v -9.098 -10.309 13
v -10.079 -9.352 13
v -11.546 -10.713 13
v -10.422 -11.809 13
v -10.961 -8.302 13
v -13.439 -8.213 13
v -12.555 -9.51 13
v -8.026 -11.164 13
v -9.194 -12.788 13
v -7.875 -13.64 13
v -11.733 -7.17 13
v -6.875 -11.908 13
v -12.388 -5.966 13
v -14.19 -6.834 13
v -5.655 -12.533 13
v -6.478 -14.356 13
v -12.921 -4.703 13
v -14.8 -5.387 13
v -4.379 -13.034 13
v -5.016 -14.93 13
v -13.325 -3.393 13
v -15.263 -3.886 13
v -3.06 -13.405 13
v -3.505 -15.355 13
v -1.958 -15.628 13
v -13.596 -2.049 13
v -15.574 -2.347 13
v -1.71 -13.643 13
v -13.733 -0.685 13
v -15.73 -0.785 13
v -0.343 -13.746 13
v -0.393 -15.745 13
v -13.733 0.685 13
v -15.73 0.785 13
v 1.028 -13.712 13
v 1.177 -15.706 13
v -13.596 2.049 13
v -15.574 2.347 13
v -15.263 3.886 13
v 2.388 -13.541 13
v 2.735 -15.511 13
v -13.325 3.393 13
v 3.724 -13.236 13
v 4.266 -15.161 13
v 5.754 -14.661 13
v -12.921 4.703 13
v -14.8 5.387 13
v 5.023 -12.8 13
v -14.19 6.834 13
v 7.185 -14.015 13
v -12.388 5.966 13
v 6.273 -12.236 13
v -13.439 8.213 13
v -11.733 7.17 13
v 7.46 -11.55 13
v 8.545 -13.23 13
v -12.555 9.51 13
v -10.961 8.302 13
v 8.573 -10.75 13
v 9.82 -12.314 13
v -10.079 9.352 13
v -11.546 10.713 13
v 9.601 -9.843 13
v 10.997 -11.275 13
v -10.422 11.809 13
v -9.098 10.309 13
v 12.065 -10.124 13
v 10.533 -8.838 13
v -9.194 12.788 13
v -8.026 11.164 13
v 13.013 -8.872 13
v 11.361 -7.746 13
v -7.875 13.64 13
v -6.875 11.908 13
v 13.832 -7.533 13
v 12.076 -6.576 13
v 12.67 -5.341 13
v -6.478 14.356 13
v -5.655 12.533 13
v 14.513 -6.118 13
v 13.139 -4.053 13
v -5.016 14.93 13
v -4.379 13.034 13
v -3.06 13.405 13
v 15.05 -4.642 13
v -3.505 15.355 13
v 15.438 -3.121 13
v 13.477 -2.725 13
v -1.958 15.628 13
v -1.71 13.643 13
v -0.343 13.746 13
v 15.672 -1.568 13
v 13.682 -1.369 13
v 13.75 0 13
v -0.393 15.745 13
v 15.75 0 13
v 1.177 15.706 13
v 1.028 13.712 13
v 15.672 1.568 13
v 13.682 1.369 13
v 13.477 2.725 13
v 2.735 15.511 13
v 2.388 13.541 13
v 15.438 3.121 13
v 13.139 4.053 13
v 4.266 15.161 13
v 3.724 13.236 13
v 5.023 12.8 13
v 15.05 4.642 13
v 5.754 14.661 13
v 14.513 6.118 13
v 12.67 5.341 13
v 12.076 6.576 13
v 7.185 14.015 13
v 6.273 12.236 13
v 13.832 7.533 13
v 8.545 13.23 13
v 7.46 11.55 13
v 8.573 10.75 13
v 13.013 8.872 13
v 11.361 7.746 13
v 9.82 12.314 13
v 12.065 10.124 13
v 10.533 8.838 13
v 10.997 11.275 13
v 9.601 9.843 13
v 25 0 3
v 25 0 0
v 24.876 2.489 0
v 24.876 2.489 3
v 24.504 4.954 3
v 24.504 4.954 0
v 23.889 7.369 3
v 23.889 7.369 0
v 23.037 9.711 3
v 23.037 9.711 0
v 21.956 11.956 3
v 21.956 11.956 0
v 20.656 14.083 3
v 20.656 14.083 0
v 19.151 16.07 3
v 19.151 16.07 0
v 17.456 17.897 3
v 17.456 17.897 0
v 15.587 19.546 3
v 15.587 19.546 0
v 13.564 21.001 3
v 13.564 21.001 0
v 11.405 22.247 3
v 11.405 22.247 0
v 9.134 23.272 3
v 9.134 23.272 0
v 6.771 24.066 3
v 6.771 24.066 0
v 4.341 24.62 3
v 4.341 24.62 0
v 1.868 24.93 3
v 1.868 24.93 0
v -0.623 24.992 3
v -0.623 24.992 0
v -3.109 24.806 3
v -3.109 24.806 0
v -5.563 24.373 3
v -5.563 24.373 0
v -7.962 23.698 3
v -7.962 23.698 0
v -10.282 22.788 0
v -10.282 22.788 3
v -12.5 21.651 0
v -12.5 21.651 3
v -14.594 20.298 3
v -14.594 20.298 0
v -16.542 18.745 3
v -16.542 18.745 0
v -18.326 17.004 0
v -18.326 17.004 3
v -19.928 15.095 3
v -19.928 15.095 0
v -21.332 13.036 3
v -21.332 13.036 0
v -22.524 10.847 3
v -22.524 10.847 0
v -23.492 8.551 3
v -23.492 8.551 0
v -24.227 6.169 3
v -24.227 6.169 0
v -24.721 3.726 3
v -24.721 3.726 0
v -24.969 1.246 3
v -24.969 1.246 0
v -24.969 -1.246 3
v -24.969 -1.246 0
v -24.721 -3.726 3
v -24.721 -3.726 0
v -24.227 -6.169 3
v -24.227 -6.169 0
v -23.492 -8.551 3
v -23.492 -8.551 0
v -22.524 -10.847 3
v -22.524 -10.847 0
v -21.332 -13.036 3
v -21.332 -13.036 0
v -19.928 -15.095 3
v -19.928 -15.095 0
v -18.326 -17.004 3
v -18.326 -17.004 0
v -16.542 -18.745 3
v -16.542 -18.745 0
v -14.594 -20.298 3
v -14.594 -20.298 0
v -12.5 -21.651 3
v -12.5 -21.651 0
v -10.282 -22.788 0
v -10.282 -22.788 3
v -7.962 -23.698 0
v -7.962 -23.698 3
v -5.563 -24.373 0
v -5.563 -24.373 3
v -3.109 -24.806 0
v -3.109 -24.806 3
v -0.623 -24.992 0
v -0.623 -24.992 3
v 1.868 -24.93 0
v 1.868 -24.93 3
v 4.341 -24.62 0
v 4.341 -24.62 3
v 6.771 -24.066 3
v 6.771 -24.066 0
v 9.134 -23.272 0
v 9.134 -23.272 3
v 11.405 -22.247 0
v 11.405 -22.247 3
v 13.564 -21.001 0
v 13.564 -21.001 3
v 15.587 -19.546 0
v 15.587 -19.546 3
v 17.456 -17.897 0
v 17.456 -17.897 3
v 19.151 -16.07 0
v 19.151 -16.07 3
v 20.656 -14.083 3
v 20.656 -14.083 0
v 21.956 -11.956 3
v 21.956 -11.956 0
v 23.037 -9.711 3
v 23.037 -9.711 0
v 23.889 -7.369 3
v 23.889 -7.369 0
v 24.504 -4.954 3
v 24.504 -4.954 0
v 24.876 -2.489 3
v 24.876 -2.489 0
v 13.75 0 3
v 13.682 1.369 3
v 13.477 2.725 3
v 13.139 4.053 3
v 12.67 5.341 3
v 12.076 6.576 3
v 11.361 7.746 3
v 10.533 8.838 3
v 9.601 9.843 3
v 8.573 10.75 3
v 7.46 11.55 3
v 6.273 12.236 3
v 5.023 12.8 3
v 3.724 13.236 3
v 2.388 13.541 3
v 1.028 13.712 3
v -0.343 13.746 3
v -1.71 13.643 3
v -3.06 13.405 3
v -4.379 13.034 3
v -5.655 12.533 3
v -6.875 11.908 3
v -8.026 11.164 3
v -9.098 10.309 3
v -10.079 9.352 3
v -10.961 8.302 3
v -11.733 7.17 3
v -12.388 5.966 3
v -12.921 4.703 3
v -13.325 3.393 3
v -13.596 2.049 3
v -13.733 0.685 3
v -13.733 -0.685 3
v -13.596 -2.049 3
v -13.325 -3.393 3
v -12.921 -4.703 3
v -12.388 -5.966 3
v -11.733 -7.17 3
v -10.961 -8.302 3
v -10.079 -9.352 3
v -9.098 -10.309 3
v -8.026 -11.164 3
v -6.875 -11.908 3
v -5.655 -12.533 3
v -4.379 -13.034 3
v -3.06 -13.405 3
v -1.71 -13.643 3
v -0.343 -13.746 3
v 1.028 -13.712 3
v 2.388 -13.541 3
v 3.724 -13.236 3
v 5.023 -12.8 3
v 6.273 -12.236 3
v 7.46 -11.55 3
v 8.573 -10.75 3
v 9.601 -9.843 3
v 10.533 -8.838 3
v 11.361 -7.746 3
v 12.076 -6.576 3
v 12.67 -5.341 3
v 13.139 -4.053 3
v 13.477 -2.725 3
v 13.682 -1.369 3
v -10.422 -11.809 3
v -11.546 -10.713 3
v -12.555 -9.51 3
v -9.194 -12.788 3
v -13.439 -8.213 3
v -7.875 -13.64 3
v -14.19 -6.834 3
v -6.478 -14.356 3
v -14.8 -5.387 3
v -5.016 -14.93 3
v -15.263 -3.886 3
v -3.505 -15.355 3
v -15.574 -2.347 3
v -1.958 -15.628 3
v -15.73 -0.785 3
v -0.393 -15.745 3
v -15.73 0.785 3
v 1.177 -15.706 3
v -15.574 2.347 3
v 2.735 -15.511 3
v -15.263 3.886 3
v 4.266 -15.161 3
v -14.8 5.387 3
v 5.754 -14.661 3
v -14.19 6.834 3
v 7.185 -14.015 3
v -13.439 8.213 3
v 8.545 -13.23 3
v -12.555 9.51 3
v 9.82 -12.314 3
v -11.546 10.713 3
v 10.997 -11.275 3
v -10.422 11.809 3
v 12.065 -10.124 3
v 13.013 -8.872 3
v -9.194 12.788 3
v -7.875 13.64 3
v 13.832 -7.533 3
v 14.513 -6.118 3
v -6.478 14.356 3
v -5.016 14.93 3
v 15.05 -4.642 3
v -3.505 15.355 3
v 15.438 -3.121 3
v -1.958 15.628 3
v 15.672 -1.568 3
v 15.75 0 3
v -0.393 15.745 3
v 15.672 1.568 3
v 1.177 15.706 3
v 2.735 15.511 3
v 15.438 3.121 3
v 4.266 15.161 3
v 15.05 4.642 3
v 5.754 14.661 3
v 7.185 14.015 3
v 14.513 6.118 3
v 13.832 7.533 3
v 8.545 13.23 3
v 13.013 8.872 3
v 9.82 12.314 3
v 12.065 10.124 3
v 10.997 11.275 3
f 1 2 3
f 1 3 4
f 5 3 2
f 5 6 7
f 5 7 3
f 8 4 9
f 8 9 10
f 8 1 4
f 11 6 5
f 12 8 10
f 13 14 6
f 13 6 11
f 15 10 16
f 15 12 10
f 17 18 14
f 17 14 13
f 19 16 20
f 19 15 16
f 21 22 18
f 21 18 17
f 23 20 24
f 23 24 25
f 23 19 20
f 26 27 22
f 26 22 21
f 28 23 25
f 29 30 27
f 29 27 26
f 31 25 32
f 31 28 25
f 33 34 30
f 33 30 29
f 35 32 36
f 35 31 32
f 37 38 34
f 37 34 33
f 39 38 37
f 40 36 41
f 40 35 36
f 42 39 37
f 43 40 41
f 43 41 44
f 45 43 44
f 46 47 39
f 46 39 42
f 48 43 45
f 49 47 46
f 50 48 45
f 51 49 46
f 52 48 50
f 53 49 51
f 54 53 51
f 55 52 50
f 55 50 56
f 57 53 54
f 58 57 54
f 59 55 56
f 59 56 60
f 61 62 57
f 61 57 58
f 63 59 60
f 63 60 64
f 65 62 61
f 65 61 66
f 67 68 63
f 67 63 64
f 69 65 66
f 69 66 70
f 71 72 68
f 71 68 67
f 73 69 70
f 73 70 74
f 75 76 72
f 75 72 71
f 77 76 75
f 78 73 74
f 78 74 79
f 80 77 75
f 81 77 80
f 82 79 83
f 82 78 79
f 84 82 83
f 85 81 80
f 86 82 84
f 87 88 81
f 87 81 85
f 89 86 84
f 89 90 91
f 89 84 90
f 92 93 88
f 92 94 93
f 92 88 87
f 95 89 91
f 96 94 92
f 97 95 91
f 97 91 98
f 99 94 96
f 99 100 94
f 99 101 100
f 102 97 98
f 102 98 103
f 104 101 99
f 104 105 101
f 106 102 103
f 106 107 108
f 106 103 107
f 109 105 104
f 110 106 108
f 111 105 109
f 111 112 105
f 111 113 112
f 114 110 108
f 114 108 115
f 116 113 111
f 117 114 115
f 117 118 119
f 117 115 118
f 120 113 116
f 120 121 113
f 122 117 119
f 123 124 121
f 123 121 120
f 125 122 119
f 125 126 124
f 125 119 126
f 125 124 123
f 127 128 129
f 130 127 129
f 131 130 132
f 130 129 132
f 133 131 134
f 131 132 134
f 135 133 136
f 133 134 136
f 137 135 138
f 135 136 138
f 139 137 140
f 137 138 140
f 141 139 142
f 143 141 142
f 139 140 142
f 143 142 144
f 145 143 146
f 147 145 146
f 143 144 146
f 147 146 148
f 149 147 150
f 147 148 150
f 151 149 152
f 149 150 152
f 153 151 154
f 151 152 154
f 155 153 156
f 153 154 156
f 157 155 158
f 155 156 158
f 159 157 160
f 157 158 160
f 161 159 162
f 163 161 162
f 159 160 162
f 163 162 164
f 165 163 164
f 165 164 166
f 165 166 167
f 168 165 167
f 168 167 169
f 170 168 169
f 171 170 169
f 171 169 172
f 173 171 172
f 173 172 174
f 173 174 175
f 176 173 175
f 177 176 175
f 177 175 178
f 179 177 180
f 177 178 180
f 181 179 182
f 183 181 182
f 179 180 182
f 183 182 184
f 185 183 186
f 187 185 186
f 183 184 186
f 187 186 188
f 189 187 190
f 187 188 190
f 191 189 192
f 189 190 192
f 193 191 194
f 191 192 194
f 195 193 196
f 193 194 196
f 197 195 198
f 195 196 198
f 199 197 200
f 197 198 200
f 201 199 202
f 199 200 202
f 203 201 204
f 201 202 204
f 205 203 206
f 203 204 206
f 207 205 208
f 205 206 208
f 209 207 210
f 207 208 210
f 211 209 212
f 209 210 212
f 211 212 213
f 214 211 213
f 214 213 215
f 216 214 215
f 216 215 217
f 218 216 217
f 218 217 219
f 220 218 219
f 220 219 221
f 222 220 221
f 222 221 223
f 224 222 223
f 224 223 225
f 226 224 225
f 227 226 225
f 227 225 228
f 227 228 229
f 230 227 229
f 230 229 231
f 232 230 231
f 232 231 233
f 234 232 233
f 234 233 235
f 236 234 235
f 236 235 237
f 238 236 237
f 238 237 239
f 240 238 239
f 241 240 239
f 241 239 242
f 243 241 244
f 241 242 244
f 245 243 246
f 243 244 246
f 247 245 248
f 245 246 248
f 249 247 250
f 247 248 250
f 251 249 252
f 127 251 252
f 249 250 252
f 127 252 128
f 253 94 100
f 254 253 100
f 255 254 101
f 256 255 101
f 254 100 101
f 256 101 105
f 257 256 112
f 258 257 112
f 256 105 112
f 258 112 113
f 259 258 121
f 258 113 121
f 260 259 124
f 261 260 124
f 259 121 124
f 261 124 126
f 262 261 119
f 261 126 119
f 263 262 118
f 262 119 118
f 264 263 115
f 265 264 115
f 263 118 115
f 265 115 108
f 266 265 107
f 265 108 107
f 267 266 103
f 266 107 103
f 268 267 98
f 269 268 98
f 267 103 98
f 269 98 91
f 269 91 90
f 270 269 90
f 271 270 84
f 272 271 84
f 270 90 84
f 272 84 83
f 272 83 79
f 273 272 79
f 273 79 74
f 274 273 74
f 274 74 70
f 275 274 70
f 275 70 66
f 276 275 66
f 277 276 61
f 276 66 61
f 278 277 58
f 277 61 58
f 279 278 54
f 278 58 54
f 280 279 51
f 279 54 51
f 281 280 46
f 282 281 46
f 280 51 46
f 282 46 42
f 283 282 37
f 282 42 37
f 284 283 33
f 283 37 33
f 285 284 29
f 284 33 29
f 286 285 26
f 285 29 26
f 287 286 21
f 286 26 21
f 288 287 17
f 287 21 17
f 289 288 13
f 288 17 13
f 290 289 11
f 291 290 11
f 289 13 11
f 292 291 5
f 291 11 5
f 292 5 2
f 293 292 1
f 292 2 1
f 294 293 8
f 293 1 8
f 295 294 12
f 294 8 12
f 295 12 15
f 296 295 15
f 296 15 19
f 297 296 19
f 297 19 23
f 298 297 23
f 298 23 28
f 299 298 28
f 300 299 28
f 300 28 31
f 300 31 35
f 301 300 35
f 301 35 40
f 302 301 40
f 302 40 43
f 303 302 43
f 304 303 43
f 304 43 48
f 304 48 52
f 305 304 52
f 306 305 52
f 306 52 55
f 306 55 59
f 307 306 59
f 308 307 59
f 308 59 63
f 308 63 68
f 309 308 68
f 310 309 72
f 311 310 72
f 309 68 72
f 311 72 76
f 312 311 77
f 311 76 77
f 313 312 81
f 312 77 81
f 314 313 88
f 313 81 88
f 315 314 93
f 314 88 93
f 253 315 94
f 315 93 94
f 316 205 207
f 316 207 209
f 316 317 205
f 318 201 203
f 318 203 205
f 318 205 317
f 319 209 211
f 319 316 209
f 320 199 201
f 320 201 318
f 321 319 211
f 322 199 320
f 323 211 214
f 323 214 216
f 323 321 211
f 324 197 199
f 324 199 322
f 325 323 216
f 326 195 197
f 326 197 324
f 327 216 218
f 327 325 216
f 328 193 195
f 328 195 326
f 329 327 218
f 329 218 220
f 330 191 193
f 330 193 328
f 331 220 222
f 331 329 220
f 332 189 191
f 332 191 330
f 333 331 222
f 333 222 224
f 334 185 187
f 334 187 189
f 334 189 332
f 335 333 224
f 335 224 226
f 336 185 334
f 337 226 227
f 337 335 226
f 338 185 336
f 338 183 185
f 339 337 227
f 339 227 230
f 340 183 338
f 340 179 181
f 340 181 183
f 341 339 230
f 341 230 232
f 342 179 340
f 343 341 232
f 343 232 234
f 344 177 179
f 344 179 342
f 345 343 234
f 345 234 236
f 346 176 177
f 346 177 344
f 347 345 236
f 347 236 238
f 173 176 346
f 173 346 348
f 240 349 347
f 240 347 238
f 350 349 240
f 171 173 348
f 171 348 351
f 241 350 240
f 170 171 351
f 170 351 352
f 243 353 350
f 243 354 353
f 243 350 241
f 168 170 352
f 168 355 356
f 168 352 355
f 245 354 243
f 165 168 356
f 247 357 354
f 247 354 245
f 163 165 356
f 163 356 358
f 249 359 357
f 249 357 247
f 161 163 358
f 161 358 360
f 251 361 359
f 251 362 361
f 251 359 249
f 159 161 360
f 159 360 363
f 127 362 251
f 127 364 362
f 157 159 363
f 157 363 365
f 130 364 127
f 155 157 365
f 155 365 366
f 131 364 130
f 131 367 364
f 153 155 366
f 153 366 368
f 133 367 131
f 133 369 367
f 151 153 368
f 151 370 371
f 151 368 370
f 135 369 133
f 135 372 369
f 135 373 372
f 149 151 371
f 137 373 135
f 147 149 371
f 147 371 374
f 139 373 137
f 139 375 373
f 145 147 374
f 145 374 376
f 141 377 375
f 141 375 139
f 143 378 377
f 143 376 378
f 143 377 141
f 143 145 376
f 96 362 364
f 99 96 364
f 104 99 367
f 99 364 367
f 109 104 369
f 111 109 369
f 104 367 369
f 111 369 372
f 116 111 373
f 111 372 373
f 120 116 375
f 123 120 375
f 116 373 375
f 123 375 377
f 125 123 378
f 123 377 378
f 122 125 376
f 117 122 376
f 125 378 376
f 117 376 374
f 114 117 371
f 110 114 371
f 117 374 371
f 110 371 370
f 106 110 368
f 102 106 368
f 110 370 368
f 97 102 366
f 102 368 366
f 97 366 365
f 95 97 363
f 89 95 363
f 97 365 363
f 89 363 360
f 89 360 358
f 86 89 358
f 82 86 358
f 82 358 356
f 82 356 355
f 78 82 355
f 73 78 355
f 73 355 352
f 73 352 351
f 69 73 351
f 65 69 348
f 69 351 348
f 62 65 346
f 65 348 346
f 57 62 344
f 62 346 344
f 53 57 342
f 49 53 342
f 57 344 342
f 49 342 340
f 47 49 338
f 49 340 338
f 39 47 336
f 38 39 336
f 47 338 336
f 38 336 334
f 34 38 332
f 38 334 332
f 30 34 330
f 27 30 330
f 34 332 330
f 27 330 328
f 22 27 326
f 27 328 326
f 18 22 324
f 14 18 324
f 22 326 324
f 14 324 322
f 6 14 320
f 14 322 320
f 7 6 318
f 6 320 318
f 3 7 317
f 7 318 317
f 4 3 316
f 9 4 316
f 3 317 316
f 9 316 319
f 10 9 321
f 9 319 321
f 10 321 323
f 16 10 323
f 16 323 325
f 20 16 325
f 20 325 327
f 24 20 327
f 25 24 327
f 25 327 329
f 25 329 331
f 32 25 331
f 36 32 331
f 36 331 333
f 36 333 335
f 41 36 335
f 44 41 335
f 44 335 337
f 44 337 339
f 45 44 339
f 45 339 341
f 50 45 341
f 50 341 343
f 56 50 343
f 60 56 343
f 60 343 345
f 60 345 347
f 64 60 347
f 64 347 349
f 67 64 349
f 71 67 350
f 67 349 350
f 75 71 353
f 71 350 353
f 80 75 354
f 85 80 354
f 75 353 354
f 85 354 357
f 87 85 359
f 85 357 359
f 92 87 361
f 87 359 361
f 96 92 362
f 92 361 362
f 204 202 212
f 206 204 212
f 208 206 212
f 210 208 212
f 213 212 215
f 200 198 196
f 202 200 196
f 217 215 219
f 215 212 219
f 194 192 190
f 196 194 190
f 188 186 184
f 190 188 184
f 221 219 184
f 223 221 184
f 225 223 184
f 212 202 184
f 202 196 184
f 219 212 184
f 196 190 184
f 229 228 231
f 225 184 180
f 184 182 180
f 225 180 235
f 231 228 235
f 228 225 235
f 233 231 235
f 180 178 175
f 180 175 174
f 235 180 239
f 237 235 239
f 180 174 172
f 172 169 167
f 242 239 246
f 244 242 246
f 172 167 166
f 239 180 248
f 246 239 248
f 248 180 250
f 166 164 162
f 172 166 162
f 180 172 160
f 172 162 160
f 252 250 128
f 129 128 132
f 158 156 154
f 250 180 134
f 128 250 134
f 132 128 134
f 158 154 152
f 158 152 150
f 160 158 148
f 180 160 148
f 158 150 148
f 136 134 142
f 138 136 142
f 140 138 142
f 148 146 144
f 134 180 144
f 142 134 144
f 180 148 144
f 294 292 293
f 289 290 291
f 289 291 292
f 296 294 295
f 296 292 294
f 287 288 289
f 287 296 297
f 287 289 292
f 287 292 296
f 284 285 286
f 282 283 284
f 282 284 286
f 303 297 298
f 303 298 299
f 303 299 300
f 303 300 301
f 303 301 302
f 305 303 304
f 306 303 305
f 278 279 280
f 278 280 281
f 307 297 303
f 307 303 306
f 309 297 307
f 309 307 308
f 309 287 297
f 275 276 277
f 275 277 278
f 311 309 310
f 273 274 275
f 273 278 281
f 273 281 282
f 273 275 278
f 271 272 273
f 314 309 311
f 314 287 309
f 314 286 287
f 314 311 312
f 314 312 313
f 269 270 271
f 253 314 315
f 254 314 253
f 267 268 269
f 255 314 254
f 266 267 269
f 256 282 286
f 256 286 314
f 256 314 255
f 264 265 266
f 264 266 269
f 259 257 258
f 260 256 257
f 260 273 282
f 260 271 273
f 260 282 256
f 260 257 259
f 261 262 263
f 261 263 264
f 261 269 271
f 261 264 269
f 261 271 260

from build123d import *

# Parameters (mm, degrees)
F0_R     = 25
F1_DEPTH = 3
F2_R     = 15.75
F3_DEPTH = 10
F4_R     = 13.75
F5_DEPTH = 10


with BuildPart() as f1:
    # F0 (on Top) → F1 (new body)
    with BuildSketch(Plane.XY):
        Circle(F0_R)
    extrude(amount=F1_DEPTH)

    # F2 (on face) → F3 (join)
    with BuildSketch(Plane.XY.offset(3)):
        Circle(F2_R)
    extrude(amount=F3_DEPTH)

    # F4 (on face) → F5 (cut, through all)
    with BuildSketch(Plane.XY.offset(13)):
        Circle(F4_R)
    extrude(amount=-F5_DEPTH, mode=Mode.SUBTRACT)


solid = f1.part
